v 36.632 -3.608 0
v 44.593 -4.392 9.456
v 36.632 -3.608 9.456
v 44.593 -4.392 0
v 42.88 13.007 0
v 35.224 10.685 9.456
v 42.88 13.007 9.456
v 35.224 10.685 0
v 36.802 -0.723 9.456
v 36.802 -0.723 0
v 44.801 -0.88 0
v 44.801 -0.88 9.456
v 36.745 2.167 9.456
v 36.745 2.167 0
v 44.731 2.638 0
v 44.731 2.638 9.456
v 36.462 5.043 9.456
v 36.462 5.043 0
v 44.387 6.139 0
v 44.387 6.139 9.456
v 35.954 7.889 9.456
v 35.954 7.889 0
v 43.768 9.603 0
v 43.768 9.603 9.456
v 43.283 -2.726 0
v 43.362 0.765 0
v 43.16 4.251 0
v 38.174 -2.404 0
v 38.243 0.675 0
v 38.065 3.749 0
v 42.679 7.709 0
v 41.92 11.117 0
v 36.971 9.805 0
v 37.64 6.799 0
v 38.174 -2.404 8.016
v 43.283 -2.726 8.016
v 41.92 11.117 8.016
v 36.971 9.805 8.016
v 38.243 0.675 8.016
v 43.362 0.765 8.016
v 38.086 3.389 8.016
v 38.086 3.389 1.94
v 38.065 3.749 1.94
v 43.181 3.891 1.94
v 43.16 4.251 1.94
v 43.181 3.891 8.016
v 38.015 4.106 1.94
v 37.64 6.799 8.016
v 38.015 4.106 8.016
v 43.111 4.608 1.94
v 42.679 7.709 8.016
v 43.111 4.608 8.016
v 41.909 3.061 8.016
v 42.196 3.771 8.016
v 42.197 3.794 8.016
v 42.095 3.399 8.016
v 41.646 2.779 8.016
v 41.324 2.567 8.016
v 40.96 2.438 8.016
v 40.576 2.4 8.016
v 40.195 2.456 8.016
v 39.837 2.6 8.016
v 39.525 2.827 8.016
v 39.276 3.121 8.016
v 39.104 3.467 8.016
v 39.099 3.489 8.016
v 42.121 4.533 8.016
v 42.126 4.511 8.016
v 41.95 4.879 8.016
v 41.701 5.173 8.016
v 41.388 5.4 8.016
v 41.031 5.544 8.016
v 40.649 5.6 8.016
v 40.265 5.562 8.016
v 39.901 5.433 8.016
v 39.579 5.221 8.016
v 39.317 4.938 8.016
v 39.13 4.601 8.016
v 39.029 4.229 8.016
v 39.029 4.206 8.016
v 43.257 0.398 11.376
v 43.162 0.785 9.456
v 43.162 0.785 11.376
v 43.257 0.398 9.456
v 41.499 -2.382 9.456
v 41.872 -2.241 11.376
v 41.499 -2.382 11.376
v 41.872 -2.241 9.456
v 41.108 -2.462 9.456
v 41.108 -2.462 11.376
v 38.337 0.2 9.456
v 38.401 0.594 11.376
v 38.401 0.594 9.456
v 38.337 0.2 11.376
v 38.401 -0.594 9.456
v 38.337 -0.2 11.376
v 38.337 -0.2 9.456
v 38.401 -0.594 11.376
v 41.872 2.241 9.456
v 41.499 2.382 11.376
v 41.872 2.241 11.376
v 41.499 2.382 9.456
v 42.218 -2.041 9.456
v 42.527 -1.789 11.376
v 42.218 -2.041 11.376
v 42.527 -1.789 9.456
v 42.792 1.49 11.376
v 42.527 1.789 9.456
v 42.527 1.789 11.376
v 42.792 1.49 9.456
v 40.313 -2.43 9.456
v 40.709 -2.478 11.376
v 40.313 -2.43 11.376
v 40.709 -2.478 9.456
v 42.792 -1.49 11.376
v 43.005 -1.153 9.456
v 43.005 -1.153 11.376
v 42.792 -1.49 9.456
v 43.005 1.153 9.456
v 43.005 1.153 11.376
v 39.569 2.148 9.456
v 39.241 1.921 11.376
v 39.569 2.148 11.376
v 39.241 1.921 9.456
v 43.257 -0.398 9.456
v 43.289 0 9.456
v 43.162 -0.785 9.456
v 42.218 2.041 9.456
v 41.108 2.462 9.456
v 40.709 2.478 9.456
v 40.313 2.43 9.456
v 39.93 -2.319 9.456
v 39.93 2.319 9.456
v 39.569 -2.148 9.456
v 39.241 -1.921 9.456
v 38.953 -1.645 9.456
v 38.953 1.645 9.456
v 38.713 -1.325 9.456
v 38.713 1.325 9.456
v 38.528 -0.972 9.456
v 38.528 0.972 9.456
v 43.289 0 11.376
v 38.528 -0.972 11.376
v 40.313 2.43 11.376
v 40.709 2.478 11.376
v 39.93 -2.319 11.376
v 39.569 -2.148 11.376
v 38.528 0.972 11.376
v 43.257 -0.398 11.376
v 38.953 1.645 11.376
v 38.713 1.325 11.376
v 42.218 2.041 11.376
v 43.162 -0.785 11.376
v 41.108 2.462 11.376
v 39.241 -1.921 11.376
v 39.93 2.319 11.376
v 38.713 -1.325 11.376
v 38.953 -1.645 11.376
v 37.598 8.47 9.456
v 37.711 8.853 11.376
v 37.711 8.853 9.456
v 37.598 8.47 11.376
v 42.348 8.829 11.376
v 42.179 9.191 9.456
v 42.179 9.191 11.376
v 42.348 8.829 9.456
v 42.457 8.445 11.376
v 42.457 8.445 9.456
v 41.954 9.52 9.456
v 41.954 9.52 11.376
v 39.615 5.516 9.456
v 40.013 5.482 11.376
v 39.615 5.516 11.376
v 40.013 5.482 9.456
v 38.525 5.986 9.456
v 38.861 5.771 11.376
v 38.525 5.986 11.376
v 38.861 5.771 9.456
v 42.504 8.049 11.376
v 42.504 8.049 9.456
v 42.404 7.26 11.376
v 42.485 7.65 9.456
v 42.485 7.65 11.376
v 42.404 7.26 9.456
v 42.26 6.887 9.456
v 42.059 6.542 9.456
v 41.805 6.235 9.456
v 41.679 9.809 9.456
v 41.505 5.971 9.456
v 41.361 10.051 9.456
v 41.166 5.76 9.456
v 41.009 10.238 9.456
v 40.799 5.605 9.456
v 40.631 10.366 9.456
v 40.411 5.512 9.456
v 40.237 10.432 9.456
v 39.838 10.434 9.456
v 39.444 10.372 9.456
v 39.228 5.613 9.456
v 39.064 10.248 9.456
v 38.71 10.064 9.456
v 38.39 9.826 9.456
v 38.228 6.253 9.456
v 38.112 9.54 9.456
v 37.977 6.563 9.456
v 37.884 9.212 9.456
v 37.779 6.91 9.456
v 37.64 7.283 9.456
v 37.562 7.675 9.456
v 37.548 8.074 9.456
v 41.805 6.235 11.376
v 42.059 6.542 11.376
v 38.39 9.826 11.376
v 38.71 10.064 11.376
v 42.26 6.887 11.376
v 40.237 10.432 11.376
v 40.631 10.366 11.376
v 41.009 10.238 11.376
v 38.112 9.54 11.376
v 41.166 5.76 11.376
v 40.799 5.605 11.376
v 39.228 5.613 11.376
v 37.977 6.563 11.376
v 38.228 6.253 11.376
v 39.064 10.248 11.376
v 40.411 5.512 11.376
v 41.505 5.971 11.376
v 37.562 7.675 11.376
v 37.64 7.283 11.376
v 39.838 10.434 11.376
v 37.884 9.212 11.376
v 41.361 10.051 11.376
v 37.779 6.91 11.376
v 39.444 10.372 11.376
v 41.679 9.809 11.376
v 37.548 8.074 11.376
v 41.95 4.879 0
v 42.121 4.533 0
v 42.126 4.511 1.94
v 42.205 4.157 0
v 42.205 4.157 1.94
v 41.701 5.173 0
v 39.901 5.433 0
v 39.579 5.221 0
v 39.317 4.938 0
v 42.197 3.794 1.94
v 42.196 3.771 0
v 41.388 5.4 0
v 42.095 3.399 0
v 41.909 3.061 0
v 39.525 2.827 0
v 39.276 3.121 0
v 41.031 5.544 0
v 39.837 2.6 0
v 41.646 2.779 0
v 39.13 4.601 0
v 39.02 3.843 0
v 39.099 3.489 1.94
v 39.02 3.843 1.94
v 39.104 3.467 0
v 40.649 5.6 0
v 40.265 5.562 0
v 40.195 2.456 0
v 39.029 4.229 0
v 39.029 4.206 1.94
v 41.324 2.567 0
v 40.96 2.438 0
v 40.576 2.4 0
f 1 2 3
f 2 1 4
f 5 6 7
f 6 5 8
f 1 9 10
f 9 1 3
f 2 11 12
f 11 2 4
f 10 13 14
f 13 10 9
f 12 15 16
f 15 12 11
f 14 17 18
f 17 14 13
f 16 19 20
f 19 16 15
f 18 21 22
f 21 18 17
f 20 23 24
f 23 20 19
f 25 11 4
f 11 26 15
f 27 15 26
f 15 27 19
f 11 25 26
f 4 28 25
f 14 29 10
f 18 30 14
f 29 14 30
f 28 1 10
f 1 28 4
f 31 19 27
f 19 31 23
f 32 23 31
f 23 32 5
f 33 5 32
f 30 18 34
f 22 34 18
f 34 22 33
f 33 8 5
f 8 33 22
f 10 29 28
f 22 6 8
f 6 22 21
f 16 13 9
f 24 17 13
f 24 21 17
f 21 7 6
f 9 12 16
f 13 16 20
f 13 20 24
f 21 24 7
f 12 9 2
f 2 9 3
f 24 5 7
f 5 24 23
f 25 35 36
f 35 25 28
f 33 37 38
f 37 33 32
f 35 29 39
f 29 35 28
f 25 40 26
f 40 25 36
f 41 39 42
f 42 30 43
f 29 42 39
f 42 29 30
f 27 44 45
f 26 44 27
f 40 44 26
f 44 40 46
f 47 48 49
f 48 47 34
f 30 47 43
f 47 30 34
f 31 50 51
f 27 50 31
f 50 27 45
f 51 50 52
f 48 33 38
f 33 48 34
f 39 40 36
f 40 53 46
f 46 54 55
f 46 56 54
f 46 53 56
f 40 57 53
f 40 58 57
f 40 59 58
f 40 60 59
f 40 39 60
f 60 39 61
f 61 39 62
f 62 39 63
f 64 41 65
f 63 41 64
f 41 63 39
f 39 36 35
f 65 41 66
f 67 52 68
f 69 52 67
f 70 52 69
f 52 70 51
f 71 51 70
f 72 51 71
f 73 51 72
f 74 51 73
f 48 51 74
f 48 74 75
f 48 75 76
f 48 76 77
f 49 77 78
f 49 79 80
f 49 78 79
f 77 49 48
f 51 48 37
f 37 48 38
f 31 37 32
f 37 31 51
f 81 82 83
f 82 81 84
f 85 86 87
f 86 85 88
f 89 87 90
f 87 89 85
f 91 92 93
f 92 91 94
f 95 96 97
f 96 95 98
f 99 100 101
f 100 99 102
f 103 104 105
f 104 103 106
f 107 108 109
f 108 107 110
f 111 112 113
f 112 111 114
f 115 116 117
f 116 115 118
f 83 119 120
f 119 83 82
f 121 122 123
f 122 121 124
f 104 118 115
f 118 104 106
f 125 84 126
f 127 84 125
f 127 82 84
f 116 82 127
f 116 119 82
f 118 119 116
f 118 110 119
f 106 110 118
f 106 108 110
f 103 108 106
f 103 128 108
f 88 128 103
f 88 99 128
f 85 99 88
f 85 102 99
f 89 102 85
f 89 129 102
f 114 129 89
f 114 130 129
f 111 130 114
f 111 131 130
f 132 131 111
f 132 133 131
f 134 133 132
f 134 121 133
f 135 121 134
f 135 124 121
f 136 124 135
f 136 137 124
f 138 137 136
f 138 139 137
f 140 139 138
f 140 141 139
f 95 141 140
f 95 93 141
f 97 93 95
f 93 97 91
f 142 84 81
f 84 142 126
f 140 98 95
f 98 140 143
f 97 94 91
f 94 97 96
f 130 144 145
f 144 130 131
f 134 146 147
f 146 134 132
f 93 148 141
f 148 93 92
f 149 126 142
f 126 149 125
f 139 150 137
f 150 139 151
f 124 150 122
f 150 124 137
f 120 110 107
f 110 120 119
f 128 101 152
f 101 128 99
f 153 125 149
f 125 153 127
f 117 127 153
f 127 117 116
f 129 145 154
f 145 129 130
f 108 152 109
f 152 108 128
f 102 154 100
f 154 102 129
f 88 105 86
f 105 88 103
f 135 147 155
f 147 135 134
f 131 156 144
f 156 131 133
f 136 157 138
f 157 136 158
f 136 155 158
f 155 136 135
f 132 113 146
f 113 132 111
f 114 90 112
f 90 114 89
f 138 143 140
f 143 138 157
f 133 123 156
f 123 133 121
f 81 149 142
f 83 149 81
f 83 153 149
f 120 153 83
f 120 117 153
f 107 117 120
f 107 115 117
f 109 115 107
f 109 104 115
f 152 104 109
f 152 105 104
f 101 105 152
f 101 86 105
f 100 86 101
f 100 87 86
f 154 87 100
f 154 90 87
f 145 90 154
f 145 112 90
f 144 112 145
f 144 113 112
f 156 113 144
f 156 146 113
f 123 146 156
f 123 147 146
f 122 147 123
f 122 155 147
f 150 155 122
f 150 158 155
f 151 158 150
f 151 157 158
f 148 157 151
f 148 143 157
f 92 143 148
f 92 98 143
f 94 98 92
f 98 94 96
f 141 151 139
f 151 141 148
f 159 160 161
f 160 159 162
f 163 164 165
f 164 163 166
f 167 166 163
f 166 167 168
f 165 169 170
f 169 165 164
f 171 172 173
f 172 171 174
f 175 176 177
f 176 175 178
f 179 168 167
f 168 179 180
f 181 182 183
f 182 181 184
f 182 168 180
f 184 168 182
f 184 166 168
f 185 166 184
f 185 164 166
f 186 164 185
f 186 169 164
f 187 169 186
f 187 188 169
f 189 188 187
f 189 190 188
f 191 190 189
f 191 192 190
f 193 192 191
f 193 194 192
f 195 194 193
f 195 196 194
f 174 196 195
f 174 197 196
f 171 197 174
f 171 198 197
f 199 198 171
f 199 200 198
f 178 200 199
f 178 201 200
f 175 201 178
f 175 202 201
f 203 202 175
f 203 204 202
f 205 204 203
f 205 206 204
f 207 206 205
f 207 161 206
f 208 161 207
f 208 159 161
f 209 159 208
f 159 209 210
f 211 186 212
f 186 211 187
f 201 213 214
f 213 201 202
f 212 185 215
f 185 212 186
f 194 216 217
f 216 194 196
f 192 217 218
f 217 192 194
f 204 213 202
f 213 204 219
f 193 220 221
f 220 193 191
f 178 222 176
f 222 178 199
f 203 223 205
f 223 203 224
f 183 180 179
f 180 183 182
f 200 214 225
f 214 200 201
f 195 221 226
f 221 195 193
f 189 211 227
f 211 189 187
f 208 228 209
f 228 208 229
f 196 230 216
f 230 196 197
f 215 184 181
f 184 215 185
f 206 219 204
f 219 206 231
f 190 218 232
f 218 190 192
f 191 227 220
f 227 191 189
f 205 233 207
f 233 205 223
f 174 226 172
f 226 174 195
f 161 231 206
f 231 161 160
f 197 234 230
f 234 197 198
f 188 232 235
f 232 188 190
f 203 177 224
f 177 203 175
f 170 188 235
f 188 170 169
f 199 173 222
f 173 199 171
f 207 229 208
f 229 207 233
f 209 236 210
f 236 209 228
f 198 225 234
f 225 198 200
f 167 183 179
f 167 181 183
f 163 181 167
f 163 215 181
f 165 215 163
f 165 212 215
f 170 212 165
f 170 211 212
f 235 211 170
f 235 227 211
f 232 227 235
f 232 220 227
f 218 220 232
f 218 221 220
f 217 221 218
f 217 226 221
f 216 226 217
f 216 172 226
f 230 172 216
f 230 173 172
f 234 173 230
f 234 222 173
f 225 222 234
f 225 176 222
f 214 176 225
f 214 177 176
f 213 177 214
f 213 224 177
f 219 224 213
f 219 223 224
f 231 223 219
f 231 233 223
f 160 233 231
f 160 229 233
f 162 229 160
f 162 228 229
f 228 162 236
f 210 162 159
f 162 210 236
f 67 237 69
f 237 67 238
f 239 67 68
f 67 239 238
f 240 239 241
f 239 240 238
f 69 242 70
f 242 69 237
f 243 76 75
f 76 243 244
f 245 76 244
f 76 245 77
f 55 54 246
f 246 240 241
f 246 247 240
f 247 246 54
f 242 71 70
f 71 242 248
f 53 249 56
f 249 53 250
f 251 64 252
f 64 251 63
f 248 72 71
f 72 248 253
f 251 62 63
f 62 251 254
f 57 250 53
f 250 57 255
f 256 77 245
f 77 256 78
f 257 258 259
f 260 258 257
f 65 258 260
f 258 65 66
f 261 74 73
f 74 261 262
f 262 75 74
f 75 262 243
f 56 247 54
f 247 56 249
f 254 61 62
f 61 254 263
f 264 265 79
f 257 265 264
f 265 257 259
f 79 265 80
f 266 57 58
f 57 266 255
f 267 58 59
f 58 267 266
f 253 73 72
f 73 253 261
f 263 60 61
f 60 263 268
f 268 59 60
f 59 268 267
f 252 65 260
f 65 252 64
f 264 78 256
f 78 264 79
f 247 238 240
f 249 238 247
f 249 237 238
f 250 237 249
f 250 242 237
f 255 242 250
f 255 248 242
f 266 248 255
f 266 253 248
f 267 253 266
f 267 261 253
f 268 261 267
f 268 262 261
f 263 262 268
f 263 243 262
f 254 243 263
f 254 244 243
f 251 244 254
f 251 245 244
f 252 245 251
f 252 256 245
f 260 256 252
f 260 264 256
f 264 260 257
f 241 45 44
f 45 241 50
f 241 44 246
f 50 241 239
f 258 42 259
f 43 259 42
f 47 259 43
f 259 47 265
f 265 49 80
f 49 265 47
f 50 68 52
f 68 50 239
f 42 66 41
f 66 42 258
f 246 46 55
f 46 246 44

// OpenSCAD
// file: BrickFunctions.scad
/*

Functions for Circular Modular Bricks

*/



// Return the first matching value from an attribute list such as
// [["flattop", 1], ["window", 0]].  Keeping this lookup in one place lets a
// builder resolve each option once rather than walking the complete list at
// every stage of its CSG tree.
function attributeValue(parameter_list, name, default_value=0, index=0) =
    index >= len(parameter_list) ? default_value :
    parameter_list[index][0] == name ? parameter_list[index][1] :
    attributeValue(parameter_list, name, default_value, index+1);

function nameExists(name, parameter_list, index=0) =
    index >= len(parameter_list) ? false :
    parameter_list[index][0] == name ? true :
    nameExists(name, parameter_list, index+1);
// file: RoundBattlementBuilder.scad
/*

Make curved battlements for 3D printing that are compatible with LEGO brands
bricks.

*/

use <RoundBrickBuilder.scad>;


// Build a complete round brick first, then remove alternating wedges from the
// upper half.  Subtracting the crenels after adding the studs means that studs
// survive only where a merlon still has material beneath it.
module roundBattlement(outer_radius=7, inner_radius=6, height=6,
		degrees_start=0, degrees_end=90, merlon_angle=12, crenel_angle=10,
		phase=0, studs=true) {
	sweep = degrees_end-degrees_start;
	period = merlon_angle+crenel_angle;
	crenel_floor = height*PLATE_HEIGHT/2;
	pattern_origin = degrees_start+phase;

	assert(outer_radius > inner_radius,
		"roundBattlement: outer_radius must be greater than inner_radius");
	assert(inner_radius >= 0,
		"roundBattlement: inner_radius must not be negative");
	assert(height > 0, "roundBattlement: height must be positive");
	assert(sweep > 0 && sweep <= 360,
		"roundBattlement: the angular sweep must be greater than 0 and at most 360 degrees");
	assert(merlon_angle > 0 && crenel_angle > 0,
		"roundBattlement: merlon_angle and crenel_angle must be positive");

	difference() {
		roundBrick(
			outer_radius=outer_radius,
			inner_radius=inner_radius,
			height=height,
			degrees_start=degrees_start,
			degrees_end=degrees_end,
			attributes=studs ? [] : [["flattop", 1]]
		);

		// Include a pattern repeat on either side of the requested arc, then
		// clip each crenel to its ends. This also handles negative phases and
		// patterns whose first or last crenel crosses an end face.
		for (repeat = [
			floor((degrees_start-pattern_origin-merlon_angle)/period)-1 :
			ceil((degrees_end-pattern_origin-merlon_angle)/period)+1
		])
			let(
				unclipped_start=pattern_origin+merlon_angle+repeat*period,
				unclipped_end=unclipped_start+crenel_angle,
				crenel_start=max(degrees_start, unclipped_start),
				crenel_end=min(degrees_end, unclipped_end)
			)
				if (crenel_end > crenel_start)
					_roundCrenelCutter(
						outer_radius, inner_radius, height,
						crenel_floor, crenel_start, crenel_end
					);
	}
}


// A radial wedge with a small overlap at every material boundary.  Keeping the
// cutter as a revolved radial volume produces straight, genuinely open crenels
// rather than a scalloped outer wall.
module _roundCrenelCutter(outer_radius, inner_radius, height, floor_height,
		degrees_start, degrees_end) {
	overlap = .02;
	rotate([0, 0, degrees_start])
		rotate_extrude(angle=degrees_end-degrees_start, convexity=10)
			polygon([
				[max(0, inner_radius*BRICK_WIDTH-overlap), floor_height-overlap],
				[max(0, inner_radius*BRICK_WIDTH-overlap), height*PLATE_HEIGHT+STUD_HEIGHT+overlap],
				[outer_radius*BRICK_WIDTH+overlap, height*PLATE_HEIGHT+STUD_HEIGHT+overlap],
				[outer_radius*BRICK_WIDTH+overlap, floor_height-overlap]
			]);
}
// file: RectBrickBuilder.scad
/*

 Basic Lego brick builder module for OpenScad by Jorg Janssen 2013 (CC BY-NC 3.0) 
 To use this in your own projects add:

 use <path_to_this_file/lego_brick_builder.scad>
 brick (length, width, height [,smooth]);

 Length and width are in standard lego brick dimensions. 
 Height is in flat brick heights, so for a normal lego brick height = 3.
 Add optional smooth = true for a brick without studs. 
 Use height = 0 to just put studs/knobs on top of other things.
*/

module rectBrick (length = 4, width = 2, height = 3, studstyle = 1 ){

	difference() {
		union() {
			makeShell(length,width,height,studstyle);

			// Studs
			if(studstyle>0){
				makeStuds(length,width,height,studstyle);
			}
			antistuds(length,width,height,studstyle);
		}
	//	chamfer_corners(length,width,height);
	}
}

module makeShell(length,width,height,studstyle=0) {

	 // brick shell 
	 difference(){
		cube(size = [length*BRICK_WIDTH-CORRECTION,width*BRICK_WIDTH-CORRECTION,height*PLATE_HEIGHT]);
		translate([WALL_THICKNESS,WALL_THICKNESS,-WALL_THICKNESS])
		union(){
			cube(size = [length*BRICK_WIDTH-2*WALL_THICKNESS,width*BRICK_WIDTH-2*WALL_THICKNESS,
                        (height*PLATE_HEIGHT)+(FLU*.25)]);
			// stud inner holes, radius = pin radius
			if (studstyle != 0) {
				translate([STUD_RADIUS+WALL_THICKNESS,STUD_RADIUS+WALL_THICKNESS,height*PLATE_HEIGHT])
				for (y = [0:width-1]){
					for (x = [0:length-1]){
						translate ([x*BRICK_WIDTH-WALL_THICKNESS,y*BRICK_WIDTH-WALL_THICKNESS,-CORRECTION])
						cylinder(h=WALL_THICKNESS+2*CORRECTION,r=PIN_RADIUS);
					}
				} 
			} 
			// small bottom line edge for smooth bricks
			if (studstyle !=0) {
				translate([-WALL_THICKNESS-CORRECTION,-WALL_THICKNESS-CORRECTION,FLU-CORRECTION]) 
				difference() {
					cube([length*BRICK_WIDTH+2*CORRECTION,width*BRICK_WIDTH+2*CORRECTION,EDGE+CORRECTION]);
					translate([EDGE+CORRECTION,EDGE+CORRECTION,-CORRECTION])
					cube([length*BRICK_WIDTH-2*EDGE,width*BRICK_WIDTH-2*EDGE,EDGE+3*CORRECTION]); 
				}
			}
		}
	} 
}

module makeStuds (length,width,height,studstyle=1) {

		translate([STUD_RADIUS+WALL_THICKNESS,STUD_RADIUS+WALL_THICKNESS,((studstyle==4) ? 0 : height*PLATE_HEIGHT)])			
		for (y = [0:width-1]){
			for (x = [0:length-1]){
				translate ([x*BRICK_WIDTH,y*BRICK_WIDTH,-CORRECTION])
				// Studstyle 3 Technic style studs
				if (studstyle == 3) {
					difference(){
						cylinder(h=STUD_HEIGHT+CORRECTION, r=STUD_RADIUS);
						// Stud inner holes
						translate([0,0,-CORRECTION])
						cylinder(h=STUD_HEIGHT*2+CORRECTION,r=PIN_RADIUS);
					} 
				} else if (studstyle == 2) {
					// Half filled Stud
					difference(){
						cylinder(h=STUD_HEIGHT+CORRECTION, r=STUD_RADIUS);
						// Stud inner holes
						translate([0,0,-CORRECTION])
							cylinder(h=0.5*STUD_HEIGHT+CORRECTION,r=PIN_RADIUS);
					}
				} else if (studstyle >0) {
					// Fully Filled Stud - Generic - And  (studstyle == 4) - Antistud
					cylinder(h=STUD_HEIGHT+((studstyle==4) ? CORRECTION*2 : CORRECTION), r=STUD_RADIUS+((studstyle==4) ? CORRECTION*.4 : 0));
				}	

		
			}
		}
	}


module antistuds (length = 4, width = 2, height = 3, studstyle = 1){

	// Pins x
	if (width == 1 && length > 1) {	
		for (x = [1:length-1]){
			if (height > 1 ) {
				if( studstyle == 1) {
					translate([x*BRICK_WIDTH,0.5*BRICK_WIDTH,0]) {
		                union() {
		                    cylinder(h=height*PLATE_HEIGHT-WALL_THICKNESS+CORRECTION,r=PIN_RADIUS);
		                    translate([0,0,height*PLATE_HEIGHT-STUD_HEIGHT-WALL_THICKNESS])
		                        cylinder(h=FLU+CORRECTION,r1=PIN_RADIUS,r2=PIN_RADIUS+1.9);
		                }
		            }
		        }
			}
	   		translate([x*BRICK_WIDTH-0.5*SUPPORT_THICKNESS,CORRECTION,STUD_HEIGHT])
				cube(size=[SUPPORT_THICKNESS,BRICK_WIDTH-2*CORRECTION,height*PLATE_HEIGHT-STUD_HEIGHT-WALL_THICKNESS+CORRECTION]);
		}
	}
	

	// Pins y
	if (length == 1 && width > 1) {	
		for (y = [1:width-1]) {
			translate([0.5*BRICK_WIDTH,y*BRICK_WIDTH,0])
				cylinder(h=height*PLATE_HEIGHT-WALL_THICKNESS+CORRECTION,r=PIN_RADIUS);
			// Supports
			if (height > 1) {
				translate([CORRECTION,y*BRICK_WIDTH-0.5*SUPPORT_THICKNESS,STUD_HEIGHT])
				cube(size=[BRICK_WIDTH-2*CORRECTION,SUPPORT_THICKNESS,height*PLATE_HEIGHT-STUD_HEIGHT-WALL_THICKNESS+CORRECTION]);
			}	
		}
	}
	// Anti Studs
	if (width > 1 && length > 1){
		difference(){
			union(){
				for(y = [1:width-1]){
					for(x = [1:length-1]){
						// anti studs
						translate([x*BRICK_WIDTH,y*BRICK_WIDTH,0])
						cylinder (h=height*PLATE_HEIGHT-WALL_THICKNESS+CORRECTION, r = ANTI_STUD_RADIUS);
						// Supports
						if (height > 1){
							// Support x
	//						if (x%2 == 0 && (length%2 == 0 || length%4 == 1 && x<length/2 || length%4 == 3 && x>length/2) || x%2 == 1 && (length%4 == 3 && x<length/2 || length%4 == 1 && x>length/2)) {
								translate([BRICK_WIDTH*x-0.5*SUPPORT_THICKNESS,y*BRICK_WIDTH-BRICK_WIDTH+WALL_THICKNESS-CORRECTION,STUD_HEIGHT])
                            
                                    cube(size=[SUPPORT_THICKNESS,2*BRICK_WIDTH-2*WALL_THICKNESS,height*PLATE_HEIGHT-STUD_HEIGHT-WALL_THICKNESS+CORRECTION]);

						//	}
							// Supports y							
						//	if (y%2 == 0 && (width%2 == 0 || width%4 == 1 && y<width/2 || width%4 == 3 && y>width/2) || y%2 == 1 && (width%4 == 3 && y<width/2 || width%4 == 1 && y>width/2)) {
								translate([x*BRICK_WIDTH-BRICK_WIDTH+WALL_THICKNESS-CORRECTION,BRICK_WIDTH*y-0.5*SUPPORT_THICKNESS,STUD_HEIGHT])
								cube(size=[2*BRICK_WIDTH-2*WALL_THICKNESS,SUPPORT_THICKNESS,height*PLATE_HEIGHT-STUD_HEIGHT-WALL_THICKNESS+CORRECTION]);
					//		}
						}
					}
				}
			}
			union(){
				for(y = [1:width-1]){
					for(x = [1:length-1]){
						// hollow anti studs
						translate([x*BRICK_WIDTH,y*BRICK_WIDTH,-WALL_THICKNESS])
						cylinder (h=height*PLATE_HEIGHT, r = STUD_RADIUS);				
					}
				}
			}
		}		
	}
}

	
// file: _conf.scad
/***
 * LEGO® brick dimensions
 * https://commons.wikimedia.org/wiki/File:Lego_dimensions.svg
 * http://orionrobots.co.uk/pages/lego-specifications.html
 */


FLU = 1.6; 					   // Fundamental Lego Unit = 1.6 mm
BRICK_WIDTH = 5*FLU;    	   // basic brick width
BRICK_HEIGHT = 6*FLU;   	   // basic brick height
PLATE_HEIGHT = 1.97*FLU;   	// basic plate height
WALL_THICKNESS = 0.9*FLU;   	// outer wall of the brick
STUD_RADIUS = 1.55 *FLU;  	// studs are the small cylinders on top of the brick 
							// with the lego logo ('nopje' in Dutch)
STUD_HEIGHT = FLU*1.2;
BRICK_BOTTOM = FLU*1.6;

ANTI_STUD_RADIUS = 2.1*FLU;    // an anti stud is the hollow cylinder inside 
                                    // bricks that have length > 1 and width > 1
PIN_RADIUS = FLU;           // a pin is the small cylinder inside bricks that have length = 1 or width = 1
SUPPORT_THICKNESS = 0.8;    // SUPPORT_THICKNESS: support is the thin surface between anti studs, 
                            // pins and walls, your printer might not print this thin, try thicker!
EDGE = 0.254;               // EDGE: this is the width and height of the bottom line edge of smooth bricks
CORRECTION = 0;             // CORRECTION: addition to each size, to make sure all parts connect by 
                            // moving them a little inside each other
// main file
/*

 Basic Lego brick builder module for OpenScad by Jorg Janssen 2013 (CC BY-NC 3.0) 
 To use this in your own projects add:

 use <path_to_this_file/lego_brick_builder.scad>
 brick (length, width, height [,smooth]);

 Length and width are in standard lego brick dimensions. 
 Height is in flat brick heights, so for a normal lego brick height = 3.
 Add optional smooth = true for a brick without studs. 
 Use height = 0 to just put studs/knobs on top of other things.


  roundBrick usage

  outer_radius = 2, // outside ring in lego stud increments
  inner_radius = 1,  // inner ring in lego stud increments 
  height = 3,           // height of brick in standard LEGO units 
  studstyle = 1,        // stud is hollow = 0 or filled =1 
  topstyle=3,           // topstyle 
  degrees=360,          // length of round block arc in degrees
  reduce=0,
  window=0 

*/
// Keep curved parts responsive in the preview while retaining a smooth export.
// Using a fixed $fn here made every small stud use 150 facets as well as the
// large ring, which needlessly multiplied the cost of every boolean operation.
$fn = 0;
$fa = $preview ? 12 : 4;
$fs = $preview ? 1 : 0.4;

include <_conf.scad>;
include <RectBrickBuilder.scad>;
include <RoundBrickBuilder.scad>;
include <RoundBattlementBuilder.scad>;
include <RadialBrickBuilder.scad>;

radial_brick(
    studs=2,
    circumference_studs=32,
    height=3,
    start_angle=0,
    studs_on_top=true,
    attributes=[["masonry", 0]]
);




 // this is it:
 //brick(1,6,3);
 //

	//round_brick(8,8,3, studstyle=1,radius=4,inner_radius=2,degrees=90 );
    
    /*
color("DarkKhaki") {
    
roundBattlement(
    outer_radius=7,
    inner_radius=6,
    height=6,
    degrees_start=0,
    degrees_end=90,
    merlon_angle=10,
    crenel_angle=8,
    phase=4,
    studs=true
);
}*/
    

outer_radius= 15;
inner_radius =14;
    // Negate Reduction is 1ease
reduce = 0;
height=3;

degrees_start =0;
degrees_end = 45;
supports = 0;

attributes = [["thinwall",0],["link",0],
               ["archway",0],
               ["flattop",0],
               ["window",0],
               ["chamfer",0],
               ["corbels",0],
               ["corbel_spacing",30],
               ["corbel_width",12]];

               
               
               
//translate([-BRICK_WIDTH,inner_radius*BRICK_WIDTH,0])
//rectBrick(length=2,width=2,height=3);

/*
  
color("DarkKhaki") {
    roundBrick(

        outer_radius,
        inner_radius,
        reduce,
        height,
      
        degrees_start,
        degrees_end,
        supports,

        attributes
    ); 
}

*/

/*


    roundBrick(

        outer_radius=6,
        inner_radius=2,
        reduce=0,
        height=3,
      
        degrees_start=60,
        degrees_end =75,
        supports=0,

        attributes =[["flattop",0]]
    ); 
*/
// 


//reducerBrick(5,4,3,degrees=90);


//roundBrick(4,3,3,degrees=90);

// module brick
// 
// create a lego brick length x width x height 
